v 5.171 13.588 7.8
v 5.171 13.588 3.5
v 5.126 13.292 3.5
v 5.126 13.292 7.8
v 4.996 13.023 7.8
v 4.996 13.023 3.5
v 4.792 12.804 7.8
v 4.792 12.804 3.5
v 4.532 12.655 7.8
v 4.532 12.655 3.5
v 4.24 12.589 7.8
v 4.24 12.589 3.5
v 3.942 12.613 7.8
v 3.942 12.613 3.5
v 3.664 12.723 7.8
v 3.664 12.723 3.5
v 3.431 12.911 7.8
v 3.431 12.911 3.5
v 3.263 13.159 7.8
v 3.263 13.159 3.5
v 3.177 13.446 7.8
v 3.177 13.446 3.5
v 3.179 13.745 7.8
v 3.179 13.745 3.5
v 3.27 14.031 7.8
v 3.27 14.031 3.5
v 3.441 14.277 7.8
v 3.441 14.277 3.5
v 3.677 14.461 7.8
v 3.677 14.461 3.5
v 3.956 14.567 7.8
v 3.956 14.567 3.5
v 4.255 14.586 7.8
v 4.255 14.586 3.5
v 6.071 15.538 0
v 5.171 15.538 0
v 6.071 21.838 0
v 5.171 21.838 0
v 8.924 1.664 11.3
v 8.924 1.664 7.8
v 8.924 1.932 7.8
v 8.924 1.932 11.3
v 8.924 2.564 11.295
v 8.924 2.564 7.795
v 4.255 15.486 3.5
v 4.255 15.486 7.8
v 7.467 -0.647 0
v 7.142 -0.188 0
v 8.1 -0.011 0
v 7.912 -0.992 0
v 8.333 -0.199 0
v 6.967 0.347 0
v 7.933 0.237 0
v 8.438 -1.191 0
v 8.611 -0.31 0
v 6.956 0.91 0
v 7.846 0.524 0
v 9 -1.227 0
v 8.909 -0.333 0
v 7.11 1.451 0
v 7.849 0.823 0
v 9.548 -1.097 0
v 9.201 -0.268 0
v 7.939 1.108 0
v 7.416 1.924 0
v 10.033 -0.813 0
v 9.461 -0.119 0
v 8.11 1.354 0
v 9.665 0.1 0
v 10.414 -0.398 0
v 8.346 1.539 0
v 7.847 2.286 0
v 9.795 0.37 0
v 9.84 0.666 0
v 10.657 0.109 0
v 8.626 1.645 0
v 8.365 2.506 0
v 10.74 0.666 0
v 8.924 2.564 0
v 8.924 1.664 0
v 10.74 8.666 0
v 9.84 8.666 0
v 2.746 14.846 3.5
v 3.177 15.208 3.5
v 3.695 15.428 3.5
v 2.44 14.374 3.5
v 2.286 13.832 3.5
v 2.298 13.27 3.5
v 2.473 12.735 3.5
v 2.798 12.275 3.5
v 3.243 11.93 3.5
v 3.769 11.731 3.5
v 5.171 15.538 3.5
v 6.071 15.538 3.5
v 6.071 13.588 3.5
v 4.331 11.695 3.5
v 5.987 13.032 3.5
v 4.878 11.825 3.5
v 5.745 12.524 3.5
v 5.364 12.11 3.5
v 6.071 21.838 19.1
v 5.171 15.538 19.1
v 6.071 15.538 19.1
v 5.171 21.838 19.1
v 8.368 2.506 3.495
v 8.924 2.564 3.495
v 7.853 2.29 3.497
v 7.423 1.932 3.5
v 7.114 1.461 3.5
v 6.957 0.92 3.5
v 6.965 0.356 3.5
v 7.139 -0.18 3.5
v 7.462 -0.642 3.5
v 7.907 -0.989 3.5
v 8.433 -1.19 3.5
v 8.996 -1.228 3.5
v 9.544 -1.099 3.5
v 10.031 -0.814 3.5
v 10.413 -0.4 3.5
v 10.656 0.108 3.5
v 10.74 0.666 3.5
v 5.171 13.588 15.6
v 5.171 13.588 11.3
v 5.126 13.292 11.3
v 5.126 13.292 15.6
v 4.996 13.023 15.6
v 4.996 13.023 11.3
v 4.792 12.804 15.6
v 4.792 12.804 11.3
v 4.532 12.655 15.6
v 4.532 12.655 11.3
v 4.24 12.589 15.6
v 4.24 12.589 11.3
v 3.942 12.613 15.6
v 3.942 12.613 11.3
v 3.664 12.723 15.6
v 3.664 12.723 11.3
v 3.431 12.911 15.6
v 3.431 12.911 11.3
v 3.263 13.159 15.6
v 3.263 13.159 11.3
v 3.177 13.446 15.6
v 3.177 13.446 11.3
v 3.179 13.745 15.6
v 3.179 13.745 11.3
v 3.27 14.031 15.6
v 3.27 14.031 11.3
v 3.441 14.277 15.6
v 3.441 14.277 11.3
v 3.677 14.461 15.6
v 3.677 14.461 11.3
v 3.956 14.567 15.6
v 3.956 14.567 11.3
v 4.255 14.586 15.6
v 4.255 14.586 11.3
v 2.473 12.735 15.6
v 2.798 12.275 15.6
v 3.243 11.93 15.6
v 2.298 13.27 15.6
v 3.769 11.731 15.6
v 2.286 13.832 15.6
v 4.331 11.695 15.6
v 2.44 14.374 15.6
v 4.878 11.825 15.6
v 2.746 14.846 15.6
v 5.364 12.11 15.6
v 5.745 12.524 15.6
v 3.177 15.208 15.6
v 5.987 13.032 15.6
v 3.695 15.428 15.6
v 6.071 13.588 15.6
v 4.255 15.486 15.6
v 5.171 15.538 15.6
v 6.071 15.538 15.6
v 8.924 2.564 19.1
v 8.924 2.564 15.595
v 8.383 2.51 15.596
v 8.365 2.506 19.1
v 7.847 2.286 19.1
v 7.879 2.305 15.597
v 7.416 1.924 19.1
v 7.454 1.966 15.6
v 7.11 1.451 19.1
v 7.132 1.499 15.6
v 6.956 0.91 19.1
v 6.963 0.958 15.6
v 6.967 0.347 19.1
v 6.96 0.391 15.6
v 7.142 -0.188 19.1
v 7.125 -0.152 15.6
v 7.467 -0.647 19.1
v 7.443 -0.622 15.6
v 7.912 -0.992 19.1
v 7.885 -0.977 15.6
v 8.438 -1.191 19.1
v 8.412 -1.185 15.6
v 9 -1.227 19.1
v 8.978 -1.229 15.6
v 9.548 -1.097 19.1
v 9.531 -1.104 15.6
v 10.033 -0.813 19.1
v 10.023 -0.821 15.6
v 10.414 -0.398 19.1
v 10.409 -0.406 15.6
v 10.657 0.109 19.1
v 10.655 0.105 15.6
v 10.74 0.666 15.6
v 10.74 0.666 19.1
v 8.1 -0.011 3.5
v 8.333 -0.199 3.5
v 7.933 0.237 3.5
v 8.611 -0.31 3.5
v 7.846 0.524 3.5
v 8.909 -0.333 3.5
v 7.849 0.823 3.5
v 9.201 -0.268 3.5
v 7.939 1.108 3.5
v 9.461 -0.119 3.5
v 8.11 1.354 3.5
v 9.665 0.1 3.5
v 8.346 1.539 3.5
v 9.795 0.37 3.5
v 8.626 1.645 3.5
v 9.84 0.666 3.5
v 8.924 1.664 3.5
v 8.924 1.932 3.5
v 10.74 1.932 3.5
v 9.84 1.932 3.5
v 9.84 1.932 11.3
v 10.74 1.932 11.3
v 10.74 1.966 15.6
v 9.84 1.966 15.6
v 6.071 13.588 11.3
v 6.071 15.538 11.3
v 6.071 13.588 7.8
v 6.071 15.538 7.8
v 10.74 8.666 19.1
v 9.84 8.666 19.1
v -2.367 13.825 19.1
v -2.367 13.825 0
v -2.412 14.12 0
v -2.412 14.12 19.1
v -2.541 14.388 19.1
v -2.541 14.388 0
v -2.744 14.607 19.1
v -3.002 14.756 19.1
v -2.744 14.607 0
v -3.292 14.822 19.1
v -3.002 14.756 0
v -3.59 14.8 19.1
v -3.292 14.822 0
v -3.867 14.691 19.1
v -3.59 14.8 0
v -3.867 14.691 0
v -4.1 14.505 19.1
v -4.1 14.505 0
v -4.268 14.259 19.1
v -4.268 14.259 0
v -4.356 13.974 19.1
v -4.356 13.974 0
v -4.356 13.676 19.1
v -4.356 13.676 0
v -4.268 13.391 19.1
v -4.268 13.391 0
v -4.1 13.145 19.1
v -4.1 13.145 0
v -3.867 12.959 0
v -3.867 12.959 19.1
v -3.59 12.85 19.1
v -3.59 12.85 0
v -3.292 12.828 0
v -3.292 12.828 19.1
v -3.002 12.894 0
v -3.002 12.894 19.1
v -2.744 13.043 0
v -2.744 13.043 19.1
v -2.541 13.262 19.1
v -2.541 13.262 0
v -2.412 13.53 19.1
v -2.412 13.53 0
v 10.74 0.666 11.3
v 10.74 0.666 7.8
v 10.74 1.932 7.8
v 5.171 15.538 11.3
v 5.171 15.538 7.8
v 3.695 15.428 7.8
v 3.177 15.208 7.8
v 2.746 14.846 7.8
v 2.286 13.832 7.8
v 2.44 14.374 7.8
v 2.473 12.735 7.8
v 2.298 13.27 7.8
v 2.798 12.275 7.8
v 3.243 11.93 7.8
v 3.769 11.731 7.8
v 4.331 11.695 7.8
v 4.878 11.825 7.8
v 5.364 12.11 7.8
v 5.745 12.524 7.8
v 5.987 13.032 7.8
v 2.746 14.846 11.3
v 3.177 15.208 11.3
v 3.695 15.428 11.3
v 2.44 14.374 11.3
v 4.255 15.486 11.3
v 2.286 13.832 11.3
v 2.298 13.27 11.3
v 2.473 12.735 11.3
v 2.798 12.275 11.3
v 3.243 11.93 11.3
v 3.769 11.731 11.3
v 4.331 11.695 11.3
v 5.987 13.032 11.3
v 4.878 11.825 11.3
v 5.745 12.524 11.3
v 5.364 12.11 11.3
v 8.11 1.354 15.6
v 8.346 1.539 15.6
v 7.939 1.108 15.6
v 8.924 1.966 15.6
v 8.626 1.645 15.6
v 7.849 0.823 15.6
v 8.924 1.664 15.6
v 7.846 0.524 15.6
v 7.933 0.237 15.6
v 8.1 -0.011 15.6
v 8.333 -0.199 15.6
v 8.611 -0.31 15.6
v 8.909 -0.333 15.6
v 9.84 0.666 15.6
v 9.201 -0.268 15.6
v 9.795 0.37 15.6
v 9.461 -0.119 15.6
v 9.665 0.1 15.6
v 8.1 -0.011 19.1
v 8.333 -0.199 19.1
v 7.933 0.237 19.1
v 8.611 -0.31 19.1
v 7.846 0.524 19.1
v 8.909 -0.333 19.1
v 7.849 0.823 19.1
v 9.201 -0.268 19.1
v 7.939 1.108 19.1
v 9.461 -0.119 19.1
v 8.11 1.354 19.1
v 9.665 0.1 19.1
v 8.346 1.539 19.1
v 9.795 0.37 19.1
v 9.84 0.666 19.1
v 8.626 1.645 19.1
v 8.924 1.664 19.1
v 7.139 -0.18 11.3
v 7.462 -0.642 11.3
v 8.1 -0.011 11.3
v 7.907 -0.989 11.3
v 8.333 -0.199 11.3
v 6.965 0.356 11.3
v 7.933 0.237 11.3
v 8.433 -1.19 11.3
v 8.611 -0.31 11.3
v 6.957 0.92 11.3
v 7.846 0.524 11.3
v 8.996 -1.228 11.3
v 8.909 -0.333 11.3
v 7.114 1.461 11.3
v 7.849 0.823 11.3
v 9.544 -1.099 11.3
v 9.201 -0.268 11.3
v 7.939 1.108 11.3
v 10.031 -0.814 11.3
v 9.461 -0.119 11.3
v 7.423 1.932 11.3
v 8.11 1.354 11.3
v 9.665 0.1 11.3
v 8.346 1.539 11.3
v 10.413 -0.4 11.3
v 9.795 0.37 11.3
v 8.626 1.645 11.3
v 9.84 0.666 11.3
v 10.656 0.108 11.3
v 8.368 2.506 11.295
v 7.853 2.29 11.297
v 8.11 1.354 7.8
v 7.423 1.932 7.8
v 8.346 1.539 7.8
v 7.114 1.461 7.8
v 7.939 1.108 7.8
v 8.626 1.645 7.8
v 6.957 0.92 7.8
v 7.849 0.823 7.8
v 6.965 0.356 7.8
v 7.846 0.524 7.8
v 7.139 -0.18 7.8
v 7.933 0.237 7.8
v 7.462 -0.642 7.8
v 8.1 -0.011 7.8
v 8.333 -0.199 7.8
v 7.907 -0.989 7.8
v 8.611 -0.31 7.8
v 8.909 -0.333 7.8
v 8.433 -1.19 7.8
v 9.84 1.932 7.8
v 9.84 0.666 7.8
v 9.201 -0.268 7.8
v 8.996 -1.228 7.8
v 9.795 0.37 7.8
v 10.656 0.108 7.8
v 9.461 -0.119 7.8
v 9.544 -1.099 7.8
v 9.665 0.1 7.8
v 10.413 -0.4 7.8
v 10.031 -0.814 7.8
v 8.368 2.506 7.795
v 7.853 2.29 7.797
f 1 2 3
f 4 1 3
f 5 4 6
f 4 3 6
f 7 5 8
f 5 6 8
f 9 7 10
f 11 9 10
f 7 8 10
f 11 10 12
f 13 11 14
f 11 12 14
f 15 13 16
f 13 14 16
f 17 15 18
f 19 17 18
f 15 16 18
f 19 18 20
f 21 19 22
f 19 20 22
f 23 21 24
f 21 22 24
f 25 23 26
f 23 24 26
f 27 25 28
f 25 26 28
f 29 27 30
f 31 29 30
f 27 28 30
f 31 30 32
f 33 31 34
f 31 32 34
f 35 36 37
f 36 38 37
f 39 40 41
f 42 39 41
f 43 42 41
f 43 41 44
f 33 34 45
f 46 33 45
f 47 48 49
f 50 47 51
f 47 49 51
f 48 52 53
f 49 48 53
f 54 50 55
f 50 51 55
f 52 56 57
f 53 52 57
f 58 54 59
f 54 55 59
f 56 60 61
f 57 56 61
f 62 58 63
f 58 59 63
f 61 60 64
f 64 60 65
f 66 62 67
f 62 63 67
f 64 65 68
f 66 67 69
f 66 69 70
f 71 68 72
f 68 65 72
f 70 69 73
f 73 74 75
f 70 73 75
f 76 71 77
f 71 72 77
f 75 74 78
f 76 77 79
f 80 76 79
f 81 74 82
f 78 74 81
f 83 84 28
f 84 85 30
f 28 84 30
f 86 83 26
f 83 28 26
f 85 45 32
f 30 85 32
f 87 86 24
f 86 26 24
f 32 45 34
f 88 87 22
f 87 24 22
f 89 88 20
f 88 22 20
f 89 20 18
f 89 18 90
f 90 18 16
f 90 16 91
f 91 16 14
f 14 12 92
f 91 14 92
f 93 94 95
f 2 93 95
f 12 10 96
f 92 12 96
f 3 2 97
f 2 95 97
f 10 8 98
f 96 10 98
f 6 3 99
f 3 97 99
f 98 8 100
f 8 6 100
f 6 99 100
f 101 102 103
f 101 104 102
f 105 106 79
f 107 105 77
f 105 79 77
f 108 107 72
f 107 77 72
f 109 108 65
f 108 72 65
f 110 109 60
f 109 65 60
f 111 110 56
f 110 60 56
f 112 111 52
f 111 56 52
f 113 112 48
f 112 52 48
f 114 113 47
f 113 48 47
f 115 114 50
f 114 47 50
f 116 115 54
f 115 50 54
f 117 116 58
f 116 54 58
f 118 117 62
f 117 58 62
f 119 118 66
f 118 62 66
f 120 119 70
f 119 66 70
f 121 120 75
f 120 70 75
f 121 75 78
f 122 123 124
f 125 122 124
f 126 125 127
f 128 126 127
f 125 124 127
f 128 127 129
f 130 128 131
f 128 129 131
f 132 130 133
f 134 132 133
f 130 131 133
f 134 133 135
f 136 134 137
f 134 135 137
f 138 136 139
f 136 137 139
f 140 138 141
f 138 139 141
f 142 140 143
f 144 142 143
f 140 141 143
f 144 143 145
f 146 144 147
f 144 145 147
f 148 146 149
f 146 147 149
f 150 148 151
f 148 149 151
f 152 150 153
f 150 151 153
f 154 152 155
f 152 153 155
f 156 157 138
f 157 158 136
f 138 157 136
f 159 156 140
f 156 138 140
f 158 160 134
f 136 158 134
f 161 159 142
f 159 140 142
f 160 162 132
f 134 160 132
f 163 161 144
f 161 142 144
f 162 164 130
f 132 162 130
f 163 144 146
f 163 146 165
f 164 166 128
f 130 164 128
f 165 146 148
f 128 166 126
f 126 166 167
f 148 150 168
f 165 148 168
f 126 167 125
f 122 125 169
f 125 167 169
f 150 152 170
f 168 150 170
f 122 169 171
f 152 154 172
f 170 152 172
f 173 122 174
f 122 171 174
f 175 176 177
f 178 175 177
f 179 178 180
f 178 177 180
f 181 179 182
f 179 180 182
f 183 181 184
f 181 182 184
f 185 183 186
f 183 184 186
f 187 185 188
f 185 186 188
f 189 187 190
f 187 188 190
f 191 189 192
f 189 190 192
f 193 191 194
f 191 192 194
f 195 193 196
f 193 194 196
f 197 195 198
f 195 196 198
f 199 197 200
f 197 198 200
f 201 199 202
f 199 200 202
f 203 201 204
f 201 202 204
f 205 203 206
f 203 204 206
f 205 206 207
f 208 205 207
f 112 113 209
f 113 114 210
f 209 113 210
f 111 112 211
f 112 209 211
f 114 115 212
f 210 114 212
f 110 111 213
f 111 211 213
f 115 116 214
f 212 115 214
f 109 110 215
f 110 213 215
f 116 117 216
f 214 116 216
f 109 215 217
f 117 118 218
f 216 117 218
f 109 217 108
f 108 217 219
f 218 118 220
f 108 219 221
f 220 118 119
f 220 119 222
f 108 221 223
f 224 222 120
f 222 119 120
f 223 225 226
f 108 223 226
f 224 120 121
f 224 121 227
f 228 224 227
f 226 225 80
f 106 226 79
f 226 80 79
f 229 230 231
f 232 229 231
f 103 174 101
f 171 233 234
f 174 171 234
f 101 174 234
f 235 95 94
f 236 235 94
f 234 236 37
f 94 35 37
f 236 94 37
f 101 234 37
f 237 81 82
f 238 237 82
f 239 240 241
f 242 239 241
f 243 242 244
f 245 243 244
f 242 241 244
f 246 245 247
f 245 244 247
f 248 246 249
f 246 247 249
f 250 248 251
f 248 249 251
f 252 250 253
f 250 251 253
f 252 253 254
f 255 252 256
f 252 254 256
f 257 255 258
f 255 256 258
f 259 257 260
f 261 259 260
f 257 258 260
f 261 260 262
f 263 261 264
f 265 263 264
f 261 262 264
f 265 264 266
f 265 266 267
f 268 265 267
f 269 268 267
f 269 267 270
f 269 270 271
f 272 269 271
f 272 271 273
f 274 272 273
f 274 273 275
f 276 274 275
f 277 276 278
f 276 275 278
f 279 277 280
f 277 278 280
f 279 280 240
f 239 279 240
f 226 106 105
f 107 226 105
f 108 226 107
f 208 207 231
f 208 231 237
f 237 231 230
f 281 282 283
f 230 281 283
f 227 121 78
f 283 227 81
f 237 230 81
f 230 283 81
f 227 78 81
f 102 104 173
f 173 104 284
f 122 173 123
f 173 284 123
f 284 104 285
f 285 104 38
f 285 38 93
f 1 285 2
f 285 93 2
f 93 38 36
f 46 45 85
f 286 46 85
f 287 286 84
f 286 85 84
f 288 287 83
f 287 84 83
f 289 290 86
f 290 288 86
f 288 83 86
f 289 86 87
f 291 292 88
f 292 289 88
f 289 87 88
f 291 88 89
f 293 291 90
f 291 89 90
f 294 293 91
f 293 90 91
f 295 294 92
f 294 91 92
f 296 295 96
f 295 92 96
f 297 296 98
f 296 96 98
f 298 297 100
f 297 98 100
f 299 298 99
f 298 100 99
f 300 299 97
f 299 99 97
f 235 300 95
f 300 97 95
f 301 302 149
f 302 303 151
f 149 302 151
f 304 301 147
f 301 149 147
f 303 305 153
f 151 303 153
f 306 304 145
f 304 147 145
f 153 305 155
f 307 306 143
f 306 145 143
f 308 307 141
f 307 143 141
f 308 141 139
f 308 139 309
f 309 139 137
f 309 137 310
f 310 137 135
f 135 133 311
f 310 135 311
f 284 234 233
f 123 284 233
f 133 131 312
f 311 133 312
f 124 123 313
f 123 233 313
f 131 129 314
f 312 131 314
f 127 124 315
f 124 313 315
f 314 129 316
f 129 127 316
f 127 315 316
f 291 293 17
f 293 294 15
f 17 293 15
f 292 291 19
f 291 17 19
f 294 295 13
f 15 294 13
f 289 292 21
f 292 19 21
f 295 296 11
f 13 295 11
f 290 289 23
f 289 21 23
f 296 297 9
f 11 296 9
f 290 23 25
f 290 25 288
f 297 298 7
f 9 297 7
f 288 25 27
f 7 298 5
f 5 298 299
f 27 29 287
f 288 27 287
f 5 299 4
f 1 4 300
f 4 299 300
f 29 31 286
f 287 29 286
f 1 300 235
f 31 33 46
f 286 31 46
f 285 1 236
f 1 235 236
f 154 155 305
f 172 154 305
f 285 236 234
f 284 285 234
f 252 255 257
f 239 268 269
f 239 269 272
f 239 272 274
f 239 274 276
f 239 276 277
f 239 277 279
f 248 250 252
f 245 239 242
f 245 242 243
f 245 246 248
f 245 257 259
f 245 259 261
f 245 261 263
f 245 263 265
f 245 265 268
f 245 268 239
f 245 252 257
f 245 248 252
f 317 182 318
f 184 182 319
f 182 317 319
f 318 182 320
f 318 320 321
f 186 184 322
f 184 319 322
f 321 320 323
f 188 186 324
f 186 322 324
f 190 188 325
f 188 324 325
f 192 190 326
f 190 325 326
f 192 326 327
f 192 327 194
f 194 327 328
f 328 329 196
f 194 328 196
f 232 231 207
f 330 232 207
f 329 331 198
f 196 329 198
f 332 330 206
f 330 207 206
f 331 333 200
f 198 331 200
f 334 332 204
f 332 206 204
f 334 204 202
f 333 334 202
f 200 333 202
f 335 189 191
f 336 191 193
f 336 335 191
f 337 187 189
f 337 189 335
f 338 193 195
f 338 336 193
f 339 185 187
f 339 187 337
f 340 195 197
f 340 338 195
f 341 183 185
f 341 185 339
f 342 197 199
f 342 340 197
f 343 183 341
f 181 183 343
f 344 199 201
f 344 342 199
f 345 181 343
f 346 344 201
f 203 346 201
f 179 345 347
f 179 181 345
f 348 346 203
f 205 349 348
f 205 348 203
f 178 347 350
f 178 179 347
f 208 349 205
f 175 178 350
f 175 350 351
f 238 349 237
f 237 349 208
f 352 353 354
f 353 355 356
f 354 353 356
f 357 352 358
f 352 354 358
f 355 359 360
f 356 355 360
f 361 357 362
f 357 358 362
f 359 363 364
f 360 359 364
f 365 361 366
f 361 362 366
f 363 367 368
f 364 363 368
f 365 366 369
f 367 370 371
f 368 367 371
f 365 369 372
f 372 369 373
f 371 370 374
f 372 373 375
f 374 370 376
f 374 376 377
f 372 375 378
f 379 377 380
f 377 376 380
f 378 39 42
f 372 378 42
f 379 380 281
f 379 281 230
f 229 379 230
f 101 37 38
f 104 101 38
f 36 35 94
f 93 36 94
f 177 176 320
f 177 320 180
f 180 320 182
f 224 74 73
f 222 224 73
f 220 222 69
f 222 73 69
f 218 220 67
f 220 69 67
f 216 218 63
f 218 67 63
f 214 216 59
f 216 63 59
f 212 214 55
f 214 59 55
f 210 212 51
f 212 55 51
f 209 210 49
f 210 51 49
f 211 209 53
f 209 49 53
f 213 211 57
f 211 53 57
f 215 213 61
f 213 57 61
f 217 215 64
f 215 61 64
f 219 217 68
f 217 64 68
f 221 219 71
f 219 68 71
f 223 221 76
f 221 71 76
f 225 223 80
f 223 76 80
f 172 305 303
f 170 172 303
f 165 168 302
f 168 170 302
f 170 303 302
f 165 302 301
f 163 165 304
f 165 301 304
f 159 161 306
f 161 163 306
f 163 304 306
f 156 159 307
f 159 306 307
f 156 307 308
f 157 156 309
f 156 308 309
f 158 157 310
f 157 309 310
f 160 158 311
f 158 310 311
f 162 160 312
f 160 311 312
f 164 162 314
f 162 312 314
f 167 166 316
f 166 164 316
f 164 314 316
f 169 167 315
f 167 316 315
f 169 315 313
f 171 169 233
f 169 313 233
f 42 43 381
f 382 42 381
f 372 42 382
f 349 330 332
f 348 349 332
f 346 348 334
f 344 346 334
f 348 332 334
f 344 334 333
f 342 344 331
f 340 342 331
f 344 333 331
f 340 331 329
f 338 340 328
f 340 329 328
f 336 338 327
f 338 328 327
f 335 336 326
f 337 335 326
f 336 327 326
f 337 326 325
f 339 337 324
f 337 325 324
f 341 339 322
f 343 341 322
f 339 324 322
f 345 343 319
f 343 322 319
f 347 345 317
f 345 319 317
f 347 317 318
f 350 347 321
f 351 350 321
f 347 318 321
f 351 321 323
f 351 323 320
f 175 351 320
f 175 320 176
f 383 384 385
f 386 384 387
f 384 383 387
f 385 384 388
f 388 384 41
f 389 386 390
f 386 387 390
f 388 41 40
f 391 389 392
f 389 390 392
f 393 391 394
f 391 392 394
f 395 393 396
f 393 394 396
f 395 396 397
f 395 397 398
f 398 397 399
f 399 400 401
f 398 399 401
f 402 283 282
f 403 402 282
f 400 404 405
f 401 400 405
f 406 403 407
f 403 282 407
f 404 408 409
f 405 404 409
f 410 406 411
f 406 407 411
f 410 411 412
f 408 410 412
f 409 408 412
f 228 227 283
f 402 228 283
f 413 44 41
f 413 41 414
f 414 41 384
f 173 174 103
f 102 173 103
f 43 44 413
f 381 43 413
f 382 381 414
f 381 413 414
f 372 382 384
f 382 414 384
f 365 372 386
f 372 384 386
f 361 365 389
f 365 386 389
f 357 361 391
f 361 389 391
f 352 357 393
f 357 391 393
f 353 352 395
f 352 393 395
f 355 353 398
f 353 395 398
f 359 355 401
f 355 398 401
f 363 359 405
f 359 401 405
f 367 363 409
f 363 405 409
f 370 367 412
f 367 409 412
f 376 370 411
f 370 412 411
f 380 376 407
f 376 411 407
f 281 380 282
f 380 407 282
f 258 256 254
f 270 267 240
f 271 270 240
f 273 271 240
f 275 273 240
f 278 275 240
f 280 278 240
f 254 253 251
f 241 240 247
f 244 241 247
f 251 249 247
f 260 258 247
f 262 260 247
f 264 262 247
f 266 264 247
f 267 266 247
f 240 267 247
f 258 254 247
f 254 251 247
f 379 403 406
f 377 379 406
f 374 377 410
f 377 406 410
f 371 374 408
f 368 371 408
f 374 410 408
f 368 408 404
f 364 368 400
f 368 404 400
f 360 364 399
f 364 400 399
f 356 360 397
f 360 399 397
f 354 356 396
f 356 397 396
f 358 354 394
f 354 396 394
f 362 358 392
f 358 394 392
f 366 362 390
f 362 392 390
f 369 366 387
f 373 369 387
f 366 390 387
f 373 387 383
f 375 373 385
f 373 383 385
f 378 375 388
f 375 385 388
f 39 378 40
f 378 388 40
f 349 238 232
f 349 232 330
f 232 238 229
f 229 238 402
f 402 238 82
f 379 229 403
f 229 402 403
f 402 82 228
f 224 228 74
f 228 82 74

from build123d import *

# Parameters (mm, degrees)
F1_DEPTH = 19.1
F0_R     = 1
F2_W     = 2.3683065209
F2_H     = 4.3
F2_W_2   = 2.4908180475
F3_DEPTH = 15.1081433349
F4_W     = 2.6818022196
F4_H     = 3.5
F4_W_2   = 1.95
F4_W_3   = 2.4897197326
F5_DEPTH = 10.4387875527
F6_DEPTH = 19.9954353951


with BuildPart() as f1:
    # F0 (on Top) → F1 (new body)
    with BuildSketch(Plane.XY):
        with BuildLine():
            Line((10.7399763687, 0.6659325571), (10.7399763687, 8.6659325571))
            Line((10.7399763687, 8.6659325571), (9.8399763687, 8.6659325571))
            Line((9.8399763687, 8.6659325571), (9.8399763687, 0.6659325571))
            ThreePointArc((9.8399763687, 0.6659325571), (8.0998586216, -0.0112987509), (8.9243799683, 1.664056903))
            Line((8.9243799683, 1.664056903), (8.9243799683, 2.564056903))
            ThreePointArc((8.9243799683, 2.564056903), (7.466956551, -0.647390168), (10.7399763687, 0.6659325571))
        make_face()
    extrude(amount=F1_DEPTH)

    # F2 (on face) → F3 (cut, through all)
    with BuildSketch(Plane.YZ.offset(10.7399763687)):
        with Locations((-0.5182207033, 13.45)):
            Rectangle(F2_W, F2_H)
        Polygon((1.9321352011, 11.3), (1.9659325571, 15.6), (0.6659325571, 15.6), (0.6659325571, 11.3), align=None)
        with Locations((-0.5794764666, 5.65)):
            Rectangle(F2_W_2, F2_H)
        Polygon((1.9321352011, 7.8), (0.6659325571, 7.8), (0.6659325571, 3.5), (1.9321352011, 3.5), (1.9321352011, 7.4659469537), align=None)
    extrude(amount=-F3_DEPTH, mode=Mode.SUBTRACT)

    # F6 (cut, through all): faces of the model
    f6_faces = [f1.faces().sort_by_distance(p)[0] for p in [
        (8.1815308669, 1.9489752068, 13.4425351912),
        (8.1738825267, 1.9321352011, 5.65),
    ]]
    extrude(f6_faces, amount=-F6_DEPTH, dir=(0, -0.9999691128, 0.0078596075), mode=Mode.SUBTRACT)


with BuildPart() as f1b:
    # F0 (on Top) → F1, piece 2 (new body)
    with BuildSketch(Plane.XY):
        with BuildLine():
            Line((6.0706205865, 13.5883718793), (6.0706205865, 21.8383718793))
            Line((6.0706205865, 21.8383718793), (5.1706205865, 21.8383718793))
            Line((5.1706205865, 21.8383718793), (5.1706205865, 13.5883718793))
            ThreePointArc((5.1706205865, 13.5883718793), (3.4305028395, 12.9111405713), (4.2550241862, 14.5864962252))
            Line((4.2550241862, 14.5864962252), (4.2550241862, 15.4864962252))
            ThreePointArc((4.2550241862, 15.4864962252), (2.7976007689, 12.2750491542), (6.0706205865, 13.5883718793))
        make_face()
    extrude(amount=F1_DEPTH)

    # F4 (on face) → F5 (cut, through all)
    with BuildSketch(Plane.YZ.offset(6.0706205865)):
        with Locations((12.2474707695, 17.35)):
            Rectangle(F4_W, F4_H)
        with Locations((14.5633718793, 17.35)):
            Rectangle(F4_W_2, F4_H)
        Polygon((13.5883718793, 7.8), (13.5883718793, 11.3), (11.9571578597, 11.3), (10.8226276934, 11.3), (10.8226276934, 7.8), (11.9571578597, 7.8), align=None)
        Polygon((15.5383718793, 7.8), (15.5383718793, 11.3), (15.3883718793, 11.3), (13.5883718793, 11.3), (13.5883718793, 7.8), (15.3883718793, 7.8), align=None)
        with Locations((12.343512013, 1.75)):
            Rectangle(F4_W_3, F4_H)
        Polygon((15.3883718793, 0), (15.5383718793, 0), (15.5383718793, 3.5), (15.3883718793, 3.5), (13.5883718793, 3.5), (13.5883718793, 0), align=None)
    extrude(amount=-F5_DEPTH, mode=Mode.SUBTRACT)


with BuildPart() as f1c:
    # F0 (on Top) → F1, piece 3 (new body)
    with BuildSketch(Plane.XY):
        with Locations((-3.3671669662, 13.8250226155)):
            Circle(F0_R)
    extrude(amount=F1_DEPTH)


solid = Compound([f1.part, f1b.part, f1c.part])
